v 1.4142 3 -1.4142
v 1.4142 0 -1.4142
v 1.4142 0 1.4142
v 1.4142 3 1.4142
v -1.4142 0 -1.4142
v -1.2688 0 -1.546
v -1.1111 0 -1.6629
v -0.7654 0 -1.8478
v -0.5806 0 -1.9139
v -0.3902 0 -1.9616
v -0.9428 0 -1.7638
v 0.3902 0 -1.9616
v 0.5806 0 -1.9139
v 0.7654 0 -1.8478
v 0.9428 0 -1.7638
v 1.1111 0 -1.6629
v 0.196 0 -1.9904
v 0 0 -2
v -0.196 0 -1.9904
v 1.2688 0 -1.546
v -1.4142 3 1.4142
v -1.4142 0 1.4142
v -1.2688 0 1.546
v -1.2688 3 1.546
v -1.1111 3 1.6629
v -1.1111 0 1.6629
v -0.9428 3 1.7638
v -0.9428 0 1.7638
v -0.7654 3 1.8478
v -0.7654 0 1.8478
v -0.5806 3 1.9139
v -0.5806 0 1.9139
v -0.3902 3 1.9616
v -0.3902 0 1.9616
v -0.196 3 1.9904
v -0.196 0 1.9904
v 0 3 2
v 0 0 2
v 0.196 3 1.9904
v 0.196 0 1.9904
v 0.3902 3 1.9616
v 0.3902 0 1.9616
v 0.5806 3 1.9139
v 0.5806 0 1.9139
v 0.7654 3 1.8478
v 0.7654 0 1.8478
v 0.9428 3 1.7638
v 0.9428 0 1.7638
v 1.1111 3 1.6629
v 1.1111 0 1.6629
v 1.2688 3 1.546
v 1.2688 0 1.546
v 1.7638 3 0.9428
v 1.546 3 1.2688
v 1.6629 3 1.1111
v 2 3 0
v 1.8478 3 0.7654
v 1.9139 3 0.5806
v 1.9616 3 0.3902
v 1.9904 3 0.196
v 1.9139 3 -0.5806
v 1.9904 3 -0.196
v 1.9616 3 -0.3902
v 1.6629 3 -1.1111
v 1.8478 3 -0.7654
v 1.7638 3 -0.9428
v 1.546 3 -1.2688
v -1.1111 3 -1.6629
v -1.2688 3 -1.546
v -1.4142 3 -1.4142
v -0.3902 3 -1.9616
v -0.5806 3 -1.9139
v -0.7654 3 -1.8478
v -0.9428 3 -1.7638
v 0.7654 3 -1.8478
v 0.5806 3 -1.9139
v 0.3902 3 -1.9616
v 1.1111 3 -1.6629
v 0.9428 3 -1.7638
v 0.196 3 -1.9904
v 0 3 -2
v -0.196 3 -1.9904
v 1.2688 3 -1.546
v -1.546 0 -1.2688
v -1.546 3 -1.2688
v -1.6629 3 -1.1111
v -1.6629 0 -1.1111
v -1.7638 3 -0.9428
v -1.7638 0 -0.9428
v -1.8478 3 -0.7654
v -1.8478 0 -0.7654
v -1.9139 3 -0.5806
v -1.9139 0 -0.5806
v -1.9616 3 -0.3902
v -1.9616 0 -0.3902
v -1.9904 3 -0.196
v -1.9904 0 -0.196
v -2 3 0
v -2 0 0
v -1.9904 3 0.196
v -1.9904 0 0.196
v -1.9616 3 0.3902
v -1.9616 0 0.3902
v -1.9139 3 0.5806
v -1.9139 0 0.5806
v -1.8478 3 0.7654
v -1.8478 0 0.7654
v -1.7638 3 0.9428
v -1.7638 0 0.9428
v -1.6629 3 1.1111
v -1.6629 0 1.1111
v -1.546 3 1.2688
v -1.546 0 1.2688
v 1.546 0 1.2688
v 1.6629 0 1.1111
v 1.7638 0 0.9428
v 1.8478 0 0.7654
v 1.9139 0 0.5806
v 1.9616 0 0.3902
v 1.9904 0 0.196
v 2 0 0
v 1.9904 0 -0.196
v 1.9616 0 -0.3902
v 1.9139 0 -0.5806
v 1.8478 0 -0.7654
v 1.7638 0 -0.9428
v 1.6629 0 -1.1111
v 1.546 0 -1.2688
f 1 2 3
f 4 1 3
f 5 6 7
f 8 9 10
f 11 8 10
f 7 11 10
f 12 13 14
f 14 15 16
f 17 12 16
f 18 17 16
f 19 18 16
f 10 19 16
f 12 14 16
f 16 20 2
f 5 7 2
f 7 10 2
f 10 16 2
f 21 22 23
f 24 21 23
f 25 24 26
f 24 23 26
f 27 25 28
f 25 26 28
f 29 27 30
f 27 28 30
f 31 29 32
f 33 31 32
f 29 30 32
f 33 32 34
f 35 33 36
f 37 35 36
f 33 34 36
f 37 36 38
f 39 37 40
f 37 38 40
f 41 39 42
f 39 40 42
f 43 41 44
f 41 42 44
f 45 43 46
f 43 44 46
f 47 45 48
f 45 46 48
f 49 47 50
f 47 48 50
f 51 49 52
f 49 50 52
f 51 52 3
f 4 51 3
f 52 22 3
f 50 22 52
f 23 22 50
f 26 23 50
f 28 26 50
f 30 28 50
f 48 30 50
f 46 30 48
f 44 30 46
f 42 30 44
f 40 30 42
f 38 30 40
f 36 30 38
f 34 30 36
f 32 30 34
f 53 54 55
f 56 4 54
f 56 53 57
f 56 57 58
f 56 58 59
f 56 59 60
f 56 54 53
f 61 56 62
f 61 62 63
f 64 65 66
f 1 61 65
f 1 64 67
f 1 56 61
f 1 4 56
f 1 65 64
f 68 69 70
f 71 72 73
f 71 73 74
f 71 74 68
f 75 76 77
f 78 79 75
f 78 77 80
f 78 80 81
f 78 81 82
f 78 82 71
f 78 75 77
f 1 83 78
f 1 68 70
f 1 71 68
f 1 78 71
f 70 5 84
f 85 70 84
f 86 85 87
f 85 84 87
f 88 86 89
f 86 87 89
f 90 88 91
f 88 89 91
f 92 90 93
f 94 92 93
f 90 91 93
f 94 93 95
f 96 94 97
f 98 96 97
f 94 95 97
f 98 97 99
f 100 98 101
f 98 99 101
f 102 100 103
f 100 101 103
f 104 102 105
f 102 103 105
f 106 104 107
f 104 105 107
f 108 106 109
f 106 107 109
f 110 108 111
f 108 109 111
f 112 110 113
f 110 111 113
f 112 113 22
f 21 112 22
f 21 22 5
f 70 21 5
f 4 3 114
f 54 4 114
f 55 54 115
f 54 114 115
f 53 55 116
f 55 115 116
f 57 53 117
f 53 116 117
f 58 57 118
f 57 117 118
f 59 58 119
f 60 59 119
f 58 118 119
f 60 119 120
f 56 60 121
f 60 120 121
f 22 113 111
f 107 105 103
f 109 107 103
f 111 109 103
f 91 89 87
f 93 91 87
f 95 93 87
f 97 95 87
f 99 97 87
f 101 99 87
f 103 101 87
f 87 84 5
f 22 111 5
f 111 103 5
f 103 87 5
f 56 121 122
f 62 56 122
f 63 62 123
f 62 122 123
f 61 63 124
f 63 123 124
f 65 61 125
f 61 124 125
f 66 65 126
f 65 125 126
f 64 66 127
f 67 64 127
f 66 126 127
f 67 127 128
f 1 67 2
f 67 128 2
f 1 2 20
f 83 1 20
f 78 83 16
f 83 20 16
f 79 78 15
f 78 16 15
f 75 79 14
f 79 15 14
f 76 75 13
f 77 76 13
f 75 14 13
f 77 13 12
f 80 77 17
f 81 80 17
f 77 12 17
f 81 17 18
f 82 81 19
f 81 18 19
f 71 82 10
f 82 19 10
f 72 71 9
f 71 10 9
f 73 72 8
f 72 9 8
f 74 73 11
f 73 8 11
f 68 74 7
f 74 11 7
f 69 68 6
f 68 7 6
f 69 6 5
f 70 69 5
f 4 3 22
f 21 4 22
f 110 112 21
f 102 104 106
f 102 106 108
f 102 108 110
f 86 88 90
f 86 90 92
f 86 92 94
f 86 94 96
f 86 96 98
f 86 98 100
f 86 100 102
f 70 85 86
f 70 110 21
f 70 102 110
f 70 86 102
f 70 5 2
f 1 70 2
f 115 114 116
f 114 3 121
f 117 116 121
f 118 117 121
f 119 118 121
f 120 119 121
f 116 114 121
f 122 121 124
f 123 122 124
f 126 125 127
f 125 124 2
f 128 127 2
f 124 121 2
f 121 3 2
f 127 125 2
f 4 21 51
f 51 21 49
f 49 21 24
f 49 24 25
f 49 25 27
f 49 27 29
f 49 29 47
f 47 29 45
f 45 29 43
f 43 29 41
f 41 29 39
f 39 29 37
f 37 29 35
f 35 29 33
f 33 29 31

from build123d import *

# Parameters (mm, degrees)
BOSS_EXTRUDE1_DEPTH   = 3
BOSS_EXTRUDE1_2_DEPTH = 3
BOSS_EXTRUDE1_3_DEPTH = 3
BOSS_EXTRUDE1_4_DEPTH = 3


with BuildPart() as part:
    # Sketch1 → Boss-Extrude1 (new body)
    with BuildSketch(Plane(origin=(0, 0, 0), x_dir=(1, 0, 0), z_dir=(0, 1, 0))):
        with BuildLine():
            ThreePointArc((1.414213562, 1.414213562), (0, 2), (-1.414213562, 1.414213562))
            Line((-1.414213562, 1.414213562), (1.414213562, 1.414213562))
        make_face()
    extrude(amount=BOSS_EXTRUDE1_DEPTH)


with BuildPart() as body_2:
    # Sketch1 → Boss-Extrude1 2 (new body)
    with BuildSketch(Plane(origin=(0, 0, 0), x_dir=(1, 0, 0), z_dir=(0, 1, 0))):
        with BuildLine():
            Line((1.414213562, 1.414213562), (1.414213562, -1.414213562))
            ThreePointArc((1.414213562, -1.414213562), (1.847759065, -0.765366865), (2, 0))
            ThreePointArc((2, 0), (1.847759065, 0.765366865), (1.414213562, 1.414213562))
        make_face()
    extrude(amount=BOSS_EXTRUDE1_2_DEPTH)


with BuildPart() as body_3:
    # Sketch1 → Boss-Extrude1 3 (new body)
    with BuildSketch(Plane(origin=(0, 0, 0), x_dir=(1, 0, 0), z_dir=(0, 1, 0))):
        with BuildLine():
            Line((1.414213562, -1.414213562), (-1.414213562, -1.414213562))
            ThreePointArc((-1.414213562, -1.414213562), (0, -2), (1.414213562, -1.414213562))
        make_face()
    extrude(amount=BOSS_EXTRUDE1_3_DEPTH)


with BuildPart() as body_4:
    # Sketch1 → Boss-Extrude1 4 (new body)
    with BuildSketch(Plane(origin=(0, 0, 0), x_dir=(1, 0, 0), z_dir=(0, 1, 0))):
        with BuildLine():
            ThreePointArc((-1.414213562, 1.414213562), (-2, 0), (-1.414213562, -1.414213562))
            Line((-1.414213562, -1.414213562), (-1.414213562, 1.414213562))
        make_face()
    extrude(amount=BOSS_EXTRUDE1_4_DEPTH)


solid = Compound([part.part, body_2.part, body_3.part, body_4.part])
